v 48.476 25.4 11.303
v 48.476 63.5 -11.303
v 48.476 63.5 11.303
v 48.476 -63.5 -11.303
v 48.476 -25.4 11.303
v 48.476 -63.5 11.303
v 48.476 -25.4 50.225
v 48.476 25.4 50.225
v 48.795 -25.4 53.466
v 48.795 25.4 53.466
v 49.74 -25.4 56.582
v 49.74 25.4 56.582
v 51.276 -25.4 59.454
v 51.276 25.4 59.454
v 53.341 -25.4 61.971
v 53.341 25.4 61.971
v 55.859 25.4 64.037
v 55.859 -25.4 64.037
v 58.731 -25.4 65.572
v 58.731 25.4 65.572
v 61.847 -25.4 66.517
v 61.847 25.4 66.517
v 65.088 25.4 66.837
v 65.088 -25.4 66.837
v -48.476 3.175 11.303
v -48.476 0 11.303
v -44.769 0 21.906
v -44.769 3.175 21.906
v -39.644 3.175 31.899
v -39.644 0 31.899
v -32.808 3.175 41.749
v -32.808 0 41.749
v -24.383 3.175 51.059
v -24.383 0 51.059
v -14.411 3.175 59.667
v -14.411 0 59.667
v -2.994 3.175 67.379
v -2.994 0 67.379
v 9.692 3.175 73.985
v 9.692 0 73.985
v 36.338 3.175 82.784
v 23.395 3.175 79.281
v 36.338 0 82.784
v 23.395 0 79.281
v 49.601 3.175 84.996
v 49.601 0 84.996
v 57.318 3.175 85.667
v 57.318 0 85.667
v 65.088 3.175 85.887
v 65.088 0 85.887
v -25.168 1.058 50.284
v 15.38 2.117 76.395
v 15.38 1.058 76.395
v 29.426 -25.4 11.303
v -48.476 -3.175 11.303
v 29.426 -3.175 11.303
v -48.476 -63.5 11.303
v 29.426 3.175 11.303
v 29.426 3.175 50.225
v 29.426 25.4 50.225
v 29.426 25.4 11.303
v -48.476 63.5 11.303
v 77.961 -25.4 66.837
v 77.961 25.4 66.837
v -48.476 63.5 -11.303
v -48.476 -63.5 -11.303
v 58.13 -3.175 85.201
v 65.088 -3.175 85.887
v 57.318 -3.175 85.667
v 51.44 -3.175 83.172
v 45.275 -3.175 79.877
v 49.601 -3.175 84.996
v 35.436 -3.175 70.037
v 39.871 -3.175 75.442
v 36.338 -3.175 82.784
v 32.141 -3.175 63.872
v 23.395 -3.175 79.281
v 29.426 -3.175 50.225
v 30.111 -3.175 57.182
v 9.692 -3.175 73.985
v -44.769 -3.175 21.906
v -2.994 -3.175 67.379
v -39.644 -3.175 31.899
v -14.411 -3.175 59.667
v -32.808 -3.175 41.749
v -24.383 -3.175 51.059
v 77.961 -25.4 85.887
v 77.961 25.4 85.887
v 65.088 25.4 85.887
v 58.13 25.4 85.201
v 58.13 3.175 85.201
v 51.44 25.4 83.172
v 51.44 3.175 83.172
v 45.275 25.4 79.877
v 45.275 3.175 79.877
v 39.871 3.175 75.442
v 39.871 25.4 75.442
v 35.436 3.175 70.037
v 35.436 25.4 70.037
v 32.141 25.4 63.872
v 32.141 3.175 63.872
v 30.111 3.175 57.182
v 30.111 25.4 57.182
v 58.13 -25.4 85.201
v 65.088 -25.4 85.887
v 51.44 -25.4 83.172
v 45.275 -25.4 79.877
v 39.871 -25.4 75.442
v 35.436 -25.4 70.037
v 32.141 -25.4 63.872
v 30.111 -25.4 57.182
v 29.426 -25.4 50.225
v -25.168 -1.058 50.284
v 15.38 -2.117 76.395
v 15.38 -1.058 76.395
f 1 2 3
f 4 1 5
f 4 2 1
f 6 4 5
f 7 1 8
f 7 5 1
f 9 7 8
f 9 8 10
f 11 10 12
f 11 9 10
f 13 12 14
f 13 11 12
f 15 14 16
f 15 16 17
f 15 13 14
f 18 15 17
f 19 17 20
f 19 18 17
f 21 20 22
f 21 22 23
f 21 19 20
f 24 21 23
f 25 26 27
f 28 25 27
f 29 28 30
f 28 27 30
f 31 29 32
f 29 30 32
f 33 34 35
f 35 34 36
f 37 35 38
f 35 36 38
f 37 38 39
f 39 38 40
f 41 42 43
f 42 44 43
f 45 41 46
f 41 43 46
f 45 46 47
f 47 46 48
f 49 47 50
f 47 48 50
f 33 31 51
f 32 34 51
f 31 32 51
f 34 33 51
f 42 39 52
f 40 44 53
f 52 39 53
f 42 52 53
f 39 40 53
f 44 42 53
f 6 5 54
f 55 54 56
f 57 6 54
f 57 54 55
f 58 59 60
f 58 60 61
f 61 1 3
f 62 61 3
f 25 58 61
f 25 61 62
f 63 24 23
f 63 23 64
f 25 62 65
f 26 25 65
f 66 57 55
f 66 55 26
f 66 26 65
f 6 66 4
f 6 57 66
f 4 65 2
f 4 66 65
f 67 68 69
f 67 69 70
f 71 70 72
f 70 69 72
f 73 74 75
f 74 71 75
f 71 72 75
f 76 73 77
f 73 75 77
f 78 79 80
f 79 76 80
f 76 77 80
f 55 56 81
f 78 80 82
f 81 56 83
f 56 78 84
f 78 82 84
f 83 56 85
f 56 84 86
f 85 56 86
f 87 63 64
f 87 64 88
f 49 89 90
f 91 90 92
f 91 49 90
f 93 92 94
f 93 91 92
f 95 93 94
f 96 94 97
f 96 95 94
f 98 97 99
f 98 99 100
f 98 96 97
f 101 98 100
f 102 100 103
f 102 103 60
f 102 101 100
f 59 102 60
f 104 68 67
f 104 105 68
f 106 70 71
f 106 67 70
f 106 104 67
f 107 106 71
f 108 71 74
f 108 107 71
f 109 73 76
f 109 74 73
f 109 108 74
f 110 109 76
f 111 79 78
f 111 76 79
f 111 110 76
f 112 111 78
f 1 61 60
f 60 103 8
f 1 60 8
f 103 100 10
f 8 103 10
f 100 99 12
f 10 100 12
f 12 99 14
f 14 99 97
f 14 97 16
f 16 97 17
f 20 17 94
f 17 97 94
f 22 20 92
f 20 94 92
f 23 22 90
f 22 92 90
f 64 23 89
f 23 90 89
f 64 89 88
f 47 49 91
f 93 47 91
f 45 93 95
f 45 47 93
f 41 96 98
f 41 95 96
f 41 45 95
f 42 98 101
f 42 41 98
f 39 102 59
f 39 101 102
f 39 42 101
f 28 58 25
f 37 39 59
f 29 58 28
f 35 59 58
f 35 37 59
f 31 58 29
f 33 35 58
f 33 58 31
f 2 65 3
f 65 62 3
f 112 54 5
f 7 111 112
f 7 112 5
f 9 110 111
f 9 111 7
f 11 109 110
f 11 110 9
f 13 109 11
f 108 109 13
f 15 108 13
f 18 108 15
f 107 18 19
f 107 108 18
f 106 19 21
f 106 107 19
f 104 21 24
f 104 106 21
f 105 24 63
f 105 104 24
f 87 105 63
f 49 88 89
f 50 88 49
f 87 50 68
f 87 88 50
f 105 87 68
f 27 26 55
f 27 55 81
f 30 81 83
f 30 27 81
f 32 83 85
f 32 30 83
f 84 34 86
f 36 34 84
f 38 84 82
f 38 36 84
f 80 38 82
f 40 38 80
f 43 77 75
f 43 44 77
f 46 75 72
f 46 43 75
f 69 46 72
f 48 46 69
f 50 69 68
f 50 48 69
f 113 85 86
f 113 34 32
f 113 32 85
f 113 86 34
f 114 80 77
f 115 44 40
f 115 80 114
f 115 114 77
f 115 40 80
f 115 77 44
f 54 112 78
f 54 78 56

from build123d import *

# Parameters (mm, degrees)
F1_DEPTH = 63.5
F2_DEPTH = 25.4
F3_DEPTH = 3.175


with BuildPart() as f1:
    # F0 (on Front) → F1 (new body, symmetric)
    with BuildSketch(Plane.XZ):
        Polygon((-48.475966, -11.303), (48.475966, -11.303), (48.475966, 11.303), (29.425966, 11.303), (-48.475966, 11.303), align=None)
    extrude(amount=F1_DEPTH, both=True)

    # F0 (on Front) → F2 (join, symmetric)
    with BuildSketch(Plane.XZ):
        with BuildLine():
            Line((29.425966, 11.303), (48.475966, 11.303))
            Line((48.475966, 11.303), (48.475966, 50.224972))
            ThreePointArc((48.475966, 50.224972), (53.341391, 61.971147), (65.087566, 66.836572))
            Line((65.087566, 66.836572), (77.961333, 66.836572))
            Line((77.961333, 66.836572), (77.961333, 85.886572))
            Line((77.961333, 85.886572), (65.087566, 85.886572))
            ThreePointArc((65.087566, 85.886572), (39.871007, 75.441531), (29.425966, 50.224972))
            Line((29.425966, 50.224972), (29.425966, 11.303))
        make_face()
    extrude(amount=F2_DEPTH, both=True)

    # F0 (on Front) → F3 (join, symmetric)
    with BuildSketch(Plane.XZ):
        with BuildLine():
            add(Edge.make_bspline(
                [(-48.475966, 11.303), (-36.481909, 55.469651), (13.493313, 85.954547), (65.087566, 85.886572)],
                knots=[0, 0, 0, 0, 135.865319, 135.865319, 135.865319, 135.865319], degree=3))
            Line((-48.475966, 11.303), (29.425966, 11.303))
            Line((29.425966, 11.303), (29.425966, 50.224972))
            ThreePointArc((29.425966, 50.224972), (39.871007, 75.441531), (65.087566, 85.886572))
        make_face()
    extrude(amount=F3_DEPTH, both=True)


solid = f1.part
